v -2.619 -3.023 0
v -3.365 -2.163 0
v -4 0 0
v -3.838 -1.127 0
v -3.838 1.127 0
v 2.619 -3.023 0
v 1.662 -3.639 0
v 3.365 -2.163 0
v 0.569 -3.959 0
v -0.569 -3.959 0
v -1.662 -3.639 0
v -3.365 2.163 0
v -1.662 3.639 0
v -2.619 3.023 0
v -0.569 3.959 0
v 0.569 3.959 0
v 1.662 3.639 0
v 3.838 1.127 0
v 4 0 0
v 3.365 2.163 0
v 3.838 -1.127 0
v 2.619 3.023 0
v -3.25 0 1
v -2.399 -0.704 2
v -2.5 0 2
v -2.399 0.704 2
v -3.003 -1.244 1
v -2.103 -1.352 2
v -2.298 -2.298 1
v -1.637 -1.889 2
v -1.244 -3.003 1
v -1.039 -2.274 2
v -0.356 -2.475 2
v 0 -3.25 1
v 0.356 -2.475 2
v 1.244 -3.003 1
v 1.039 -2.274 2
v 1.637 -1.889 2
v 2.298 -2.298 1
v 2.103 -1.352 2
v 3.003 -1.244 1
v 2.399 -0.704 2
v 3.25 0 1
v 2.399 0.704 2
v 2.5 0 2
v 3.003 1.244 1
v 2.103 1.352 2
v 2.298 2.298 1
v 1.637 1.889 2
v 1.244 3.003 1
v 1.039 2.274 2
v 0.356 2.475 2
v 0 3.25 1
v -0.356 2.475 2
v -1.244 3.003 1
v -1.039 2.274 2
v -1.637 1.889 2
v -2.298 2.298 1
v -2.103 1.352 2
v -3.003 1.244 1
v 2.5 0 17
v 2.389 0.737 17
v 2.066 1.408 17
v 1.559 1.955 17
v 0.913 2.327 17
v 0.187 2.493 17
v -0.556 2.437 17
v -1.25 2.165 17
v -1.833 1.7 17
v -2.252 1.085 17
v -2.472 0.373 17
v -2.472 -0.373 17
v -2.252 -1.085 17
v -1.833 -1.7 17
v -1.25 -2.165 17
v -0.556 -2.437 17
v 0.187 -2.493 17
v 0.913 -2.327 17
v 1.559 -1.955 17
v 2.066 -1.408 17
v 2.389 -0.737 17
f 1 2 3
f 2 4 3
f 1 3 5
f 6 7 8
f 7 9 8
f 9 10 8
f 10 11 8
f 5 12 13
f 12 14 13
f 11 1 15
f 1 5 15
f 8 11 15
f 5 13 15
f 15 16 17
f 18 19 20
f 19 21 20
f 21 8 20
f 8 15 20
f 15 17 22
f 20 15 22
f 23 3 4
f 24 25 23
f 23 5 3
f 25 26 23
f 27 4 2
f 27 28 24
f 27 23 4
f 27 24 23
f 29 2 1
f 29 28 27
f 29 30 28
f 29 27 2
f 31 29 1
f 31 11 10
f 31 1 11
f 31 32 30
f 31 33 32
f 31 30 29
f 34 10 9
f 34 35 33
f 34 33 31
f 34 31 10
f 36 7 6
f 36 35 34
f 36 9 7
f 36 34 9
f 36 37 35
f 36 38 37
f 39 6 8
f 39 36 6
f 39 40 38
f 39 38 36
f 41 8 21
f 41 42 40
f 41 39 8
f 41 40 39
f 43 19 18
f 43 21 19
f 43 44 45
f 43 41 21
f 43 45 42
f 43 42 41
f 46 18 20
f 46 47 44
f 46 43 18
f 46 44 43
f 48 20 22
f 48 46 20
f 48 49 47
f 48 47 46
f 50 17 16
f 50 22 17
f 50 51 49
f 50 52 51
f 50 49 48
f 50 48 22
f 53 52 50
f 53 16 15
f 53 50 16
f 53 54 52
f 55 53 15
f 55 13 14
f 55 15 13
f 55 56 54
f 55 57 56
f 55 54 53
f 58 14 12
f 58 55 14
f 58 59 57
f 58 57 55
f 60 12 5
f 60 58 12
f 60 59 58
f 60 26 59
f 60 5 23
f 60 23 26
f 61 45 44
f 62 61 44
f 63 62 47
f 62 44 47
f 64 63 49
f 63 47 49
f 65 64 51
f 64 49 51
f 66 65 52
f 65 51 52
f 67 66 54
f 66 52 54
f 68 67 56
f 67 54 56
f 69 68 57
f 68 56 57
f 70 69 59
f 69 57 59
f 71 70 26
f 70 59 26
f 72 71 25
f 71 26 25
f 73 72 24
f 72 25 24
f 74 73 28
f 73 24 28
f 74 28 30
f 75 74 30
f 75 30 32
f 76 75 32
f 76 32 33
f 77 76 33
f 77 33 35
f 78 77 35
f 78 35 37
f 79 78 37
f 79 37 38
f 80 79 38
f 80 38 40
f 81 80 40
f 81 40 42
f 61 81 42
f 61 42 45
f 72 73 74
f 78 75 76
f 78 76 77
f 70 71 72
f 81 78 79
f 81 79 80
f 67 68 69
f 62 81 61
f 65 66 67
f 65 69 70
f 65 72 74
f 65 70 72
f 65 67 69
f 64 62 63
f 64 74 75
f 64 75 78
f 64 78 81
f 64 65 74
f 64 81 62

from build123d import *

# Parameters (mm, degrees)
SKETCH1_R           = 4
BOSS_EXTRUDE1_DEPTH = 2
SKETCH2_R           = 2.5
BOSS_EXTRUDE2_DEPTH = 15


with BuildPart() as part:
    # Sketch1 → Boss-Extrude1 (new body)
    with BuildSketch(Plane(origin=(0, 0, 0), x_dir=(0, 1, 0), z_dir=(0, 0, 1))):
        with Locations(Location((0, 0, 0), (0, 0, 270))):
            Circle(SKETCH1_R)
    extrude(amount=BOSS_EXTRUDE1_DEPTH)

    # Sketch2 → Boss-Extrude2 (add)
    with BuildSketch(Plane.XY.offset(2)):
        Circle(SKETCH2_R)
    extrude(amount=BOSS_EXTRUDE2_DEPTH)

    # Sketch3 → Cut-Revolve1 (revolve, cut)
    with BuildSketch(Plane.YZ, mode=Mode.PRIVATE) as cut_revolve1_sk:
        Polygon((-2.5, 2), (-4, 2), (-4, 0), align=None)
    revolve(cut_revolve1_sk.sketch.rotate(Axis((0, 0, 0), (0, 0, 1)), 270), axis=Axis((0, 0, 0), (0, 0, 1)), mode=Mode.SUBTRACT)


solid = part.part
